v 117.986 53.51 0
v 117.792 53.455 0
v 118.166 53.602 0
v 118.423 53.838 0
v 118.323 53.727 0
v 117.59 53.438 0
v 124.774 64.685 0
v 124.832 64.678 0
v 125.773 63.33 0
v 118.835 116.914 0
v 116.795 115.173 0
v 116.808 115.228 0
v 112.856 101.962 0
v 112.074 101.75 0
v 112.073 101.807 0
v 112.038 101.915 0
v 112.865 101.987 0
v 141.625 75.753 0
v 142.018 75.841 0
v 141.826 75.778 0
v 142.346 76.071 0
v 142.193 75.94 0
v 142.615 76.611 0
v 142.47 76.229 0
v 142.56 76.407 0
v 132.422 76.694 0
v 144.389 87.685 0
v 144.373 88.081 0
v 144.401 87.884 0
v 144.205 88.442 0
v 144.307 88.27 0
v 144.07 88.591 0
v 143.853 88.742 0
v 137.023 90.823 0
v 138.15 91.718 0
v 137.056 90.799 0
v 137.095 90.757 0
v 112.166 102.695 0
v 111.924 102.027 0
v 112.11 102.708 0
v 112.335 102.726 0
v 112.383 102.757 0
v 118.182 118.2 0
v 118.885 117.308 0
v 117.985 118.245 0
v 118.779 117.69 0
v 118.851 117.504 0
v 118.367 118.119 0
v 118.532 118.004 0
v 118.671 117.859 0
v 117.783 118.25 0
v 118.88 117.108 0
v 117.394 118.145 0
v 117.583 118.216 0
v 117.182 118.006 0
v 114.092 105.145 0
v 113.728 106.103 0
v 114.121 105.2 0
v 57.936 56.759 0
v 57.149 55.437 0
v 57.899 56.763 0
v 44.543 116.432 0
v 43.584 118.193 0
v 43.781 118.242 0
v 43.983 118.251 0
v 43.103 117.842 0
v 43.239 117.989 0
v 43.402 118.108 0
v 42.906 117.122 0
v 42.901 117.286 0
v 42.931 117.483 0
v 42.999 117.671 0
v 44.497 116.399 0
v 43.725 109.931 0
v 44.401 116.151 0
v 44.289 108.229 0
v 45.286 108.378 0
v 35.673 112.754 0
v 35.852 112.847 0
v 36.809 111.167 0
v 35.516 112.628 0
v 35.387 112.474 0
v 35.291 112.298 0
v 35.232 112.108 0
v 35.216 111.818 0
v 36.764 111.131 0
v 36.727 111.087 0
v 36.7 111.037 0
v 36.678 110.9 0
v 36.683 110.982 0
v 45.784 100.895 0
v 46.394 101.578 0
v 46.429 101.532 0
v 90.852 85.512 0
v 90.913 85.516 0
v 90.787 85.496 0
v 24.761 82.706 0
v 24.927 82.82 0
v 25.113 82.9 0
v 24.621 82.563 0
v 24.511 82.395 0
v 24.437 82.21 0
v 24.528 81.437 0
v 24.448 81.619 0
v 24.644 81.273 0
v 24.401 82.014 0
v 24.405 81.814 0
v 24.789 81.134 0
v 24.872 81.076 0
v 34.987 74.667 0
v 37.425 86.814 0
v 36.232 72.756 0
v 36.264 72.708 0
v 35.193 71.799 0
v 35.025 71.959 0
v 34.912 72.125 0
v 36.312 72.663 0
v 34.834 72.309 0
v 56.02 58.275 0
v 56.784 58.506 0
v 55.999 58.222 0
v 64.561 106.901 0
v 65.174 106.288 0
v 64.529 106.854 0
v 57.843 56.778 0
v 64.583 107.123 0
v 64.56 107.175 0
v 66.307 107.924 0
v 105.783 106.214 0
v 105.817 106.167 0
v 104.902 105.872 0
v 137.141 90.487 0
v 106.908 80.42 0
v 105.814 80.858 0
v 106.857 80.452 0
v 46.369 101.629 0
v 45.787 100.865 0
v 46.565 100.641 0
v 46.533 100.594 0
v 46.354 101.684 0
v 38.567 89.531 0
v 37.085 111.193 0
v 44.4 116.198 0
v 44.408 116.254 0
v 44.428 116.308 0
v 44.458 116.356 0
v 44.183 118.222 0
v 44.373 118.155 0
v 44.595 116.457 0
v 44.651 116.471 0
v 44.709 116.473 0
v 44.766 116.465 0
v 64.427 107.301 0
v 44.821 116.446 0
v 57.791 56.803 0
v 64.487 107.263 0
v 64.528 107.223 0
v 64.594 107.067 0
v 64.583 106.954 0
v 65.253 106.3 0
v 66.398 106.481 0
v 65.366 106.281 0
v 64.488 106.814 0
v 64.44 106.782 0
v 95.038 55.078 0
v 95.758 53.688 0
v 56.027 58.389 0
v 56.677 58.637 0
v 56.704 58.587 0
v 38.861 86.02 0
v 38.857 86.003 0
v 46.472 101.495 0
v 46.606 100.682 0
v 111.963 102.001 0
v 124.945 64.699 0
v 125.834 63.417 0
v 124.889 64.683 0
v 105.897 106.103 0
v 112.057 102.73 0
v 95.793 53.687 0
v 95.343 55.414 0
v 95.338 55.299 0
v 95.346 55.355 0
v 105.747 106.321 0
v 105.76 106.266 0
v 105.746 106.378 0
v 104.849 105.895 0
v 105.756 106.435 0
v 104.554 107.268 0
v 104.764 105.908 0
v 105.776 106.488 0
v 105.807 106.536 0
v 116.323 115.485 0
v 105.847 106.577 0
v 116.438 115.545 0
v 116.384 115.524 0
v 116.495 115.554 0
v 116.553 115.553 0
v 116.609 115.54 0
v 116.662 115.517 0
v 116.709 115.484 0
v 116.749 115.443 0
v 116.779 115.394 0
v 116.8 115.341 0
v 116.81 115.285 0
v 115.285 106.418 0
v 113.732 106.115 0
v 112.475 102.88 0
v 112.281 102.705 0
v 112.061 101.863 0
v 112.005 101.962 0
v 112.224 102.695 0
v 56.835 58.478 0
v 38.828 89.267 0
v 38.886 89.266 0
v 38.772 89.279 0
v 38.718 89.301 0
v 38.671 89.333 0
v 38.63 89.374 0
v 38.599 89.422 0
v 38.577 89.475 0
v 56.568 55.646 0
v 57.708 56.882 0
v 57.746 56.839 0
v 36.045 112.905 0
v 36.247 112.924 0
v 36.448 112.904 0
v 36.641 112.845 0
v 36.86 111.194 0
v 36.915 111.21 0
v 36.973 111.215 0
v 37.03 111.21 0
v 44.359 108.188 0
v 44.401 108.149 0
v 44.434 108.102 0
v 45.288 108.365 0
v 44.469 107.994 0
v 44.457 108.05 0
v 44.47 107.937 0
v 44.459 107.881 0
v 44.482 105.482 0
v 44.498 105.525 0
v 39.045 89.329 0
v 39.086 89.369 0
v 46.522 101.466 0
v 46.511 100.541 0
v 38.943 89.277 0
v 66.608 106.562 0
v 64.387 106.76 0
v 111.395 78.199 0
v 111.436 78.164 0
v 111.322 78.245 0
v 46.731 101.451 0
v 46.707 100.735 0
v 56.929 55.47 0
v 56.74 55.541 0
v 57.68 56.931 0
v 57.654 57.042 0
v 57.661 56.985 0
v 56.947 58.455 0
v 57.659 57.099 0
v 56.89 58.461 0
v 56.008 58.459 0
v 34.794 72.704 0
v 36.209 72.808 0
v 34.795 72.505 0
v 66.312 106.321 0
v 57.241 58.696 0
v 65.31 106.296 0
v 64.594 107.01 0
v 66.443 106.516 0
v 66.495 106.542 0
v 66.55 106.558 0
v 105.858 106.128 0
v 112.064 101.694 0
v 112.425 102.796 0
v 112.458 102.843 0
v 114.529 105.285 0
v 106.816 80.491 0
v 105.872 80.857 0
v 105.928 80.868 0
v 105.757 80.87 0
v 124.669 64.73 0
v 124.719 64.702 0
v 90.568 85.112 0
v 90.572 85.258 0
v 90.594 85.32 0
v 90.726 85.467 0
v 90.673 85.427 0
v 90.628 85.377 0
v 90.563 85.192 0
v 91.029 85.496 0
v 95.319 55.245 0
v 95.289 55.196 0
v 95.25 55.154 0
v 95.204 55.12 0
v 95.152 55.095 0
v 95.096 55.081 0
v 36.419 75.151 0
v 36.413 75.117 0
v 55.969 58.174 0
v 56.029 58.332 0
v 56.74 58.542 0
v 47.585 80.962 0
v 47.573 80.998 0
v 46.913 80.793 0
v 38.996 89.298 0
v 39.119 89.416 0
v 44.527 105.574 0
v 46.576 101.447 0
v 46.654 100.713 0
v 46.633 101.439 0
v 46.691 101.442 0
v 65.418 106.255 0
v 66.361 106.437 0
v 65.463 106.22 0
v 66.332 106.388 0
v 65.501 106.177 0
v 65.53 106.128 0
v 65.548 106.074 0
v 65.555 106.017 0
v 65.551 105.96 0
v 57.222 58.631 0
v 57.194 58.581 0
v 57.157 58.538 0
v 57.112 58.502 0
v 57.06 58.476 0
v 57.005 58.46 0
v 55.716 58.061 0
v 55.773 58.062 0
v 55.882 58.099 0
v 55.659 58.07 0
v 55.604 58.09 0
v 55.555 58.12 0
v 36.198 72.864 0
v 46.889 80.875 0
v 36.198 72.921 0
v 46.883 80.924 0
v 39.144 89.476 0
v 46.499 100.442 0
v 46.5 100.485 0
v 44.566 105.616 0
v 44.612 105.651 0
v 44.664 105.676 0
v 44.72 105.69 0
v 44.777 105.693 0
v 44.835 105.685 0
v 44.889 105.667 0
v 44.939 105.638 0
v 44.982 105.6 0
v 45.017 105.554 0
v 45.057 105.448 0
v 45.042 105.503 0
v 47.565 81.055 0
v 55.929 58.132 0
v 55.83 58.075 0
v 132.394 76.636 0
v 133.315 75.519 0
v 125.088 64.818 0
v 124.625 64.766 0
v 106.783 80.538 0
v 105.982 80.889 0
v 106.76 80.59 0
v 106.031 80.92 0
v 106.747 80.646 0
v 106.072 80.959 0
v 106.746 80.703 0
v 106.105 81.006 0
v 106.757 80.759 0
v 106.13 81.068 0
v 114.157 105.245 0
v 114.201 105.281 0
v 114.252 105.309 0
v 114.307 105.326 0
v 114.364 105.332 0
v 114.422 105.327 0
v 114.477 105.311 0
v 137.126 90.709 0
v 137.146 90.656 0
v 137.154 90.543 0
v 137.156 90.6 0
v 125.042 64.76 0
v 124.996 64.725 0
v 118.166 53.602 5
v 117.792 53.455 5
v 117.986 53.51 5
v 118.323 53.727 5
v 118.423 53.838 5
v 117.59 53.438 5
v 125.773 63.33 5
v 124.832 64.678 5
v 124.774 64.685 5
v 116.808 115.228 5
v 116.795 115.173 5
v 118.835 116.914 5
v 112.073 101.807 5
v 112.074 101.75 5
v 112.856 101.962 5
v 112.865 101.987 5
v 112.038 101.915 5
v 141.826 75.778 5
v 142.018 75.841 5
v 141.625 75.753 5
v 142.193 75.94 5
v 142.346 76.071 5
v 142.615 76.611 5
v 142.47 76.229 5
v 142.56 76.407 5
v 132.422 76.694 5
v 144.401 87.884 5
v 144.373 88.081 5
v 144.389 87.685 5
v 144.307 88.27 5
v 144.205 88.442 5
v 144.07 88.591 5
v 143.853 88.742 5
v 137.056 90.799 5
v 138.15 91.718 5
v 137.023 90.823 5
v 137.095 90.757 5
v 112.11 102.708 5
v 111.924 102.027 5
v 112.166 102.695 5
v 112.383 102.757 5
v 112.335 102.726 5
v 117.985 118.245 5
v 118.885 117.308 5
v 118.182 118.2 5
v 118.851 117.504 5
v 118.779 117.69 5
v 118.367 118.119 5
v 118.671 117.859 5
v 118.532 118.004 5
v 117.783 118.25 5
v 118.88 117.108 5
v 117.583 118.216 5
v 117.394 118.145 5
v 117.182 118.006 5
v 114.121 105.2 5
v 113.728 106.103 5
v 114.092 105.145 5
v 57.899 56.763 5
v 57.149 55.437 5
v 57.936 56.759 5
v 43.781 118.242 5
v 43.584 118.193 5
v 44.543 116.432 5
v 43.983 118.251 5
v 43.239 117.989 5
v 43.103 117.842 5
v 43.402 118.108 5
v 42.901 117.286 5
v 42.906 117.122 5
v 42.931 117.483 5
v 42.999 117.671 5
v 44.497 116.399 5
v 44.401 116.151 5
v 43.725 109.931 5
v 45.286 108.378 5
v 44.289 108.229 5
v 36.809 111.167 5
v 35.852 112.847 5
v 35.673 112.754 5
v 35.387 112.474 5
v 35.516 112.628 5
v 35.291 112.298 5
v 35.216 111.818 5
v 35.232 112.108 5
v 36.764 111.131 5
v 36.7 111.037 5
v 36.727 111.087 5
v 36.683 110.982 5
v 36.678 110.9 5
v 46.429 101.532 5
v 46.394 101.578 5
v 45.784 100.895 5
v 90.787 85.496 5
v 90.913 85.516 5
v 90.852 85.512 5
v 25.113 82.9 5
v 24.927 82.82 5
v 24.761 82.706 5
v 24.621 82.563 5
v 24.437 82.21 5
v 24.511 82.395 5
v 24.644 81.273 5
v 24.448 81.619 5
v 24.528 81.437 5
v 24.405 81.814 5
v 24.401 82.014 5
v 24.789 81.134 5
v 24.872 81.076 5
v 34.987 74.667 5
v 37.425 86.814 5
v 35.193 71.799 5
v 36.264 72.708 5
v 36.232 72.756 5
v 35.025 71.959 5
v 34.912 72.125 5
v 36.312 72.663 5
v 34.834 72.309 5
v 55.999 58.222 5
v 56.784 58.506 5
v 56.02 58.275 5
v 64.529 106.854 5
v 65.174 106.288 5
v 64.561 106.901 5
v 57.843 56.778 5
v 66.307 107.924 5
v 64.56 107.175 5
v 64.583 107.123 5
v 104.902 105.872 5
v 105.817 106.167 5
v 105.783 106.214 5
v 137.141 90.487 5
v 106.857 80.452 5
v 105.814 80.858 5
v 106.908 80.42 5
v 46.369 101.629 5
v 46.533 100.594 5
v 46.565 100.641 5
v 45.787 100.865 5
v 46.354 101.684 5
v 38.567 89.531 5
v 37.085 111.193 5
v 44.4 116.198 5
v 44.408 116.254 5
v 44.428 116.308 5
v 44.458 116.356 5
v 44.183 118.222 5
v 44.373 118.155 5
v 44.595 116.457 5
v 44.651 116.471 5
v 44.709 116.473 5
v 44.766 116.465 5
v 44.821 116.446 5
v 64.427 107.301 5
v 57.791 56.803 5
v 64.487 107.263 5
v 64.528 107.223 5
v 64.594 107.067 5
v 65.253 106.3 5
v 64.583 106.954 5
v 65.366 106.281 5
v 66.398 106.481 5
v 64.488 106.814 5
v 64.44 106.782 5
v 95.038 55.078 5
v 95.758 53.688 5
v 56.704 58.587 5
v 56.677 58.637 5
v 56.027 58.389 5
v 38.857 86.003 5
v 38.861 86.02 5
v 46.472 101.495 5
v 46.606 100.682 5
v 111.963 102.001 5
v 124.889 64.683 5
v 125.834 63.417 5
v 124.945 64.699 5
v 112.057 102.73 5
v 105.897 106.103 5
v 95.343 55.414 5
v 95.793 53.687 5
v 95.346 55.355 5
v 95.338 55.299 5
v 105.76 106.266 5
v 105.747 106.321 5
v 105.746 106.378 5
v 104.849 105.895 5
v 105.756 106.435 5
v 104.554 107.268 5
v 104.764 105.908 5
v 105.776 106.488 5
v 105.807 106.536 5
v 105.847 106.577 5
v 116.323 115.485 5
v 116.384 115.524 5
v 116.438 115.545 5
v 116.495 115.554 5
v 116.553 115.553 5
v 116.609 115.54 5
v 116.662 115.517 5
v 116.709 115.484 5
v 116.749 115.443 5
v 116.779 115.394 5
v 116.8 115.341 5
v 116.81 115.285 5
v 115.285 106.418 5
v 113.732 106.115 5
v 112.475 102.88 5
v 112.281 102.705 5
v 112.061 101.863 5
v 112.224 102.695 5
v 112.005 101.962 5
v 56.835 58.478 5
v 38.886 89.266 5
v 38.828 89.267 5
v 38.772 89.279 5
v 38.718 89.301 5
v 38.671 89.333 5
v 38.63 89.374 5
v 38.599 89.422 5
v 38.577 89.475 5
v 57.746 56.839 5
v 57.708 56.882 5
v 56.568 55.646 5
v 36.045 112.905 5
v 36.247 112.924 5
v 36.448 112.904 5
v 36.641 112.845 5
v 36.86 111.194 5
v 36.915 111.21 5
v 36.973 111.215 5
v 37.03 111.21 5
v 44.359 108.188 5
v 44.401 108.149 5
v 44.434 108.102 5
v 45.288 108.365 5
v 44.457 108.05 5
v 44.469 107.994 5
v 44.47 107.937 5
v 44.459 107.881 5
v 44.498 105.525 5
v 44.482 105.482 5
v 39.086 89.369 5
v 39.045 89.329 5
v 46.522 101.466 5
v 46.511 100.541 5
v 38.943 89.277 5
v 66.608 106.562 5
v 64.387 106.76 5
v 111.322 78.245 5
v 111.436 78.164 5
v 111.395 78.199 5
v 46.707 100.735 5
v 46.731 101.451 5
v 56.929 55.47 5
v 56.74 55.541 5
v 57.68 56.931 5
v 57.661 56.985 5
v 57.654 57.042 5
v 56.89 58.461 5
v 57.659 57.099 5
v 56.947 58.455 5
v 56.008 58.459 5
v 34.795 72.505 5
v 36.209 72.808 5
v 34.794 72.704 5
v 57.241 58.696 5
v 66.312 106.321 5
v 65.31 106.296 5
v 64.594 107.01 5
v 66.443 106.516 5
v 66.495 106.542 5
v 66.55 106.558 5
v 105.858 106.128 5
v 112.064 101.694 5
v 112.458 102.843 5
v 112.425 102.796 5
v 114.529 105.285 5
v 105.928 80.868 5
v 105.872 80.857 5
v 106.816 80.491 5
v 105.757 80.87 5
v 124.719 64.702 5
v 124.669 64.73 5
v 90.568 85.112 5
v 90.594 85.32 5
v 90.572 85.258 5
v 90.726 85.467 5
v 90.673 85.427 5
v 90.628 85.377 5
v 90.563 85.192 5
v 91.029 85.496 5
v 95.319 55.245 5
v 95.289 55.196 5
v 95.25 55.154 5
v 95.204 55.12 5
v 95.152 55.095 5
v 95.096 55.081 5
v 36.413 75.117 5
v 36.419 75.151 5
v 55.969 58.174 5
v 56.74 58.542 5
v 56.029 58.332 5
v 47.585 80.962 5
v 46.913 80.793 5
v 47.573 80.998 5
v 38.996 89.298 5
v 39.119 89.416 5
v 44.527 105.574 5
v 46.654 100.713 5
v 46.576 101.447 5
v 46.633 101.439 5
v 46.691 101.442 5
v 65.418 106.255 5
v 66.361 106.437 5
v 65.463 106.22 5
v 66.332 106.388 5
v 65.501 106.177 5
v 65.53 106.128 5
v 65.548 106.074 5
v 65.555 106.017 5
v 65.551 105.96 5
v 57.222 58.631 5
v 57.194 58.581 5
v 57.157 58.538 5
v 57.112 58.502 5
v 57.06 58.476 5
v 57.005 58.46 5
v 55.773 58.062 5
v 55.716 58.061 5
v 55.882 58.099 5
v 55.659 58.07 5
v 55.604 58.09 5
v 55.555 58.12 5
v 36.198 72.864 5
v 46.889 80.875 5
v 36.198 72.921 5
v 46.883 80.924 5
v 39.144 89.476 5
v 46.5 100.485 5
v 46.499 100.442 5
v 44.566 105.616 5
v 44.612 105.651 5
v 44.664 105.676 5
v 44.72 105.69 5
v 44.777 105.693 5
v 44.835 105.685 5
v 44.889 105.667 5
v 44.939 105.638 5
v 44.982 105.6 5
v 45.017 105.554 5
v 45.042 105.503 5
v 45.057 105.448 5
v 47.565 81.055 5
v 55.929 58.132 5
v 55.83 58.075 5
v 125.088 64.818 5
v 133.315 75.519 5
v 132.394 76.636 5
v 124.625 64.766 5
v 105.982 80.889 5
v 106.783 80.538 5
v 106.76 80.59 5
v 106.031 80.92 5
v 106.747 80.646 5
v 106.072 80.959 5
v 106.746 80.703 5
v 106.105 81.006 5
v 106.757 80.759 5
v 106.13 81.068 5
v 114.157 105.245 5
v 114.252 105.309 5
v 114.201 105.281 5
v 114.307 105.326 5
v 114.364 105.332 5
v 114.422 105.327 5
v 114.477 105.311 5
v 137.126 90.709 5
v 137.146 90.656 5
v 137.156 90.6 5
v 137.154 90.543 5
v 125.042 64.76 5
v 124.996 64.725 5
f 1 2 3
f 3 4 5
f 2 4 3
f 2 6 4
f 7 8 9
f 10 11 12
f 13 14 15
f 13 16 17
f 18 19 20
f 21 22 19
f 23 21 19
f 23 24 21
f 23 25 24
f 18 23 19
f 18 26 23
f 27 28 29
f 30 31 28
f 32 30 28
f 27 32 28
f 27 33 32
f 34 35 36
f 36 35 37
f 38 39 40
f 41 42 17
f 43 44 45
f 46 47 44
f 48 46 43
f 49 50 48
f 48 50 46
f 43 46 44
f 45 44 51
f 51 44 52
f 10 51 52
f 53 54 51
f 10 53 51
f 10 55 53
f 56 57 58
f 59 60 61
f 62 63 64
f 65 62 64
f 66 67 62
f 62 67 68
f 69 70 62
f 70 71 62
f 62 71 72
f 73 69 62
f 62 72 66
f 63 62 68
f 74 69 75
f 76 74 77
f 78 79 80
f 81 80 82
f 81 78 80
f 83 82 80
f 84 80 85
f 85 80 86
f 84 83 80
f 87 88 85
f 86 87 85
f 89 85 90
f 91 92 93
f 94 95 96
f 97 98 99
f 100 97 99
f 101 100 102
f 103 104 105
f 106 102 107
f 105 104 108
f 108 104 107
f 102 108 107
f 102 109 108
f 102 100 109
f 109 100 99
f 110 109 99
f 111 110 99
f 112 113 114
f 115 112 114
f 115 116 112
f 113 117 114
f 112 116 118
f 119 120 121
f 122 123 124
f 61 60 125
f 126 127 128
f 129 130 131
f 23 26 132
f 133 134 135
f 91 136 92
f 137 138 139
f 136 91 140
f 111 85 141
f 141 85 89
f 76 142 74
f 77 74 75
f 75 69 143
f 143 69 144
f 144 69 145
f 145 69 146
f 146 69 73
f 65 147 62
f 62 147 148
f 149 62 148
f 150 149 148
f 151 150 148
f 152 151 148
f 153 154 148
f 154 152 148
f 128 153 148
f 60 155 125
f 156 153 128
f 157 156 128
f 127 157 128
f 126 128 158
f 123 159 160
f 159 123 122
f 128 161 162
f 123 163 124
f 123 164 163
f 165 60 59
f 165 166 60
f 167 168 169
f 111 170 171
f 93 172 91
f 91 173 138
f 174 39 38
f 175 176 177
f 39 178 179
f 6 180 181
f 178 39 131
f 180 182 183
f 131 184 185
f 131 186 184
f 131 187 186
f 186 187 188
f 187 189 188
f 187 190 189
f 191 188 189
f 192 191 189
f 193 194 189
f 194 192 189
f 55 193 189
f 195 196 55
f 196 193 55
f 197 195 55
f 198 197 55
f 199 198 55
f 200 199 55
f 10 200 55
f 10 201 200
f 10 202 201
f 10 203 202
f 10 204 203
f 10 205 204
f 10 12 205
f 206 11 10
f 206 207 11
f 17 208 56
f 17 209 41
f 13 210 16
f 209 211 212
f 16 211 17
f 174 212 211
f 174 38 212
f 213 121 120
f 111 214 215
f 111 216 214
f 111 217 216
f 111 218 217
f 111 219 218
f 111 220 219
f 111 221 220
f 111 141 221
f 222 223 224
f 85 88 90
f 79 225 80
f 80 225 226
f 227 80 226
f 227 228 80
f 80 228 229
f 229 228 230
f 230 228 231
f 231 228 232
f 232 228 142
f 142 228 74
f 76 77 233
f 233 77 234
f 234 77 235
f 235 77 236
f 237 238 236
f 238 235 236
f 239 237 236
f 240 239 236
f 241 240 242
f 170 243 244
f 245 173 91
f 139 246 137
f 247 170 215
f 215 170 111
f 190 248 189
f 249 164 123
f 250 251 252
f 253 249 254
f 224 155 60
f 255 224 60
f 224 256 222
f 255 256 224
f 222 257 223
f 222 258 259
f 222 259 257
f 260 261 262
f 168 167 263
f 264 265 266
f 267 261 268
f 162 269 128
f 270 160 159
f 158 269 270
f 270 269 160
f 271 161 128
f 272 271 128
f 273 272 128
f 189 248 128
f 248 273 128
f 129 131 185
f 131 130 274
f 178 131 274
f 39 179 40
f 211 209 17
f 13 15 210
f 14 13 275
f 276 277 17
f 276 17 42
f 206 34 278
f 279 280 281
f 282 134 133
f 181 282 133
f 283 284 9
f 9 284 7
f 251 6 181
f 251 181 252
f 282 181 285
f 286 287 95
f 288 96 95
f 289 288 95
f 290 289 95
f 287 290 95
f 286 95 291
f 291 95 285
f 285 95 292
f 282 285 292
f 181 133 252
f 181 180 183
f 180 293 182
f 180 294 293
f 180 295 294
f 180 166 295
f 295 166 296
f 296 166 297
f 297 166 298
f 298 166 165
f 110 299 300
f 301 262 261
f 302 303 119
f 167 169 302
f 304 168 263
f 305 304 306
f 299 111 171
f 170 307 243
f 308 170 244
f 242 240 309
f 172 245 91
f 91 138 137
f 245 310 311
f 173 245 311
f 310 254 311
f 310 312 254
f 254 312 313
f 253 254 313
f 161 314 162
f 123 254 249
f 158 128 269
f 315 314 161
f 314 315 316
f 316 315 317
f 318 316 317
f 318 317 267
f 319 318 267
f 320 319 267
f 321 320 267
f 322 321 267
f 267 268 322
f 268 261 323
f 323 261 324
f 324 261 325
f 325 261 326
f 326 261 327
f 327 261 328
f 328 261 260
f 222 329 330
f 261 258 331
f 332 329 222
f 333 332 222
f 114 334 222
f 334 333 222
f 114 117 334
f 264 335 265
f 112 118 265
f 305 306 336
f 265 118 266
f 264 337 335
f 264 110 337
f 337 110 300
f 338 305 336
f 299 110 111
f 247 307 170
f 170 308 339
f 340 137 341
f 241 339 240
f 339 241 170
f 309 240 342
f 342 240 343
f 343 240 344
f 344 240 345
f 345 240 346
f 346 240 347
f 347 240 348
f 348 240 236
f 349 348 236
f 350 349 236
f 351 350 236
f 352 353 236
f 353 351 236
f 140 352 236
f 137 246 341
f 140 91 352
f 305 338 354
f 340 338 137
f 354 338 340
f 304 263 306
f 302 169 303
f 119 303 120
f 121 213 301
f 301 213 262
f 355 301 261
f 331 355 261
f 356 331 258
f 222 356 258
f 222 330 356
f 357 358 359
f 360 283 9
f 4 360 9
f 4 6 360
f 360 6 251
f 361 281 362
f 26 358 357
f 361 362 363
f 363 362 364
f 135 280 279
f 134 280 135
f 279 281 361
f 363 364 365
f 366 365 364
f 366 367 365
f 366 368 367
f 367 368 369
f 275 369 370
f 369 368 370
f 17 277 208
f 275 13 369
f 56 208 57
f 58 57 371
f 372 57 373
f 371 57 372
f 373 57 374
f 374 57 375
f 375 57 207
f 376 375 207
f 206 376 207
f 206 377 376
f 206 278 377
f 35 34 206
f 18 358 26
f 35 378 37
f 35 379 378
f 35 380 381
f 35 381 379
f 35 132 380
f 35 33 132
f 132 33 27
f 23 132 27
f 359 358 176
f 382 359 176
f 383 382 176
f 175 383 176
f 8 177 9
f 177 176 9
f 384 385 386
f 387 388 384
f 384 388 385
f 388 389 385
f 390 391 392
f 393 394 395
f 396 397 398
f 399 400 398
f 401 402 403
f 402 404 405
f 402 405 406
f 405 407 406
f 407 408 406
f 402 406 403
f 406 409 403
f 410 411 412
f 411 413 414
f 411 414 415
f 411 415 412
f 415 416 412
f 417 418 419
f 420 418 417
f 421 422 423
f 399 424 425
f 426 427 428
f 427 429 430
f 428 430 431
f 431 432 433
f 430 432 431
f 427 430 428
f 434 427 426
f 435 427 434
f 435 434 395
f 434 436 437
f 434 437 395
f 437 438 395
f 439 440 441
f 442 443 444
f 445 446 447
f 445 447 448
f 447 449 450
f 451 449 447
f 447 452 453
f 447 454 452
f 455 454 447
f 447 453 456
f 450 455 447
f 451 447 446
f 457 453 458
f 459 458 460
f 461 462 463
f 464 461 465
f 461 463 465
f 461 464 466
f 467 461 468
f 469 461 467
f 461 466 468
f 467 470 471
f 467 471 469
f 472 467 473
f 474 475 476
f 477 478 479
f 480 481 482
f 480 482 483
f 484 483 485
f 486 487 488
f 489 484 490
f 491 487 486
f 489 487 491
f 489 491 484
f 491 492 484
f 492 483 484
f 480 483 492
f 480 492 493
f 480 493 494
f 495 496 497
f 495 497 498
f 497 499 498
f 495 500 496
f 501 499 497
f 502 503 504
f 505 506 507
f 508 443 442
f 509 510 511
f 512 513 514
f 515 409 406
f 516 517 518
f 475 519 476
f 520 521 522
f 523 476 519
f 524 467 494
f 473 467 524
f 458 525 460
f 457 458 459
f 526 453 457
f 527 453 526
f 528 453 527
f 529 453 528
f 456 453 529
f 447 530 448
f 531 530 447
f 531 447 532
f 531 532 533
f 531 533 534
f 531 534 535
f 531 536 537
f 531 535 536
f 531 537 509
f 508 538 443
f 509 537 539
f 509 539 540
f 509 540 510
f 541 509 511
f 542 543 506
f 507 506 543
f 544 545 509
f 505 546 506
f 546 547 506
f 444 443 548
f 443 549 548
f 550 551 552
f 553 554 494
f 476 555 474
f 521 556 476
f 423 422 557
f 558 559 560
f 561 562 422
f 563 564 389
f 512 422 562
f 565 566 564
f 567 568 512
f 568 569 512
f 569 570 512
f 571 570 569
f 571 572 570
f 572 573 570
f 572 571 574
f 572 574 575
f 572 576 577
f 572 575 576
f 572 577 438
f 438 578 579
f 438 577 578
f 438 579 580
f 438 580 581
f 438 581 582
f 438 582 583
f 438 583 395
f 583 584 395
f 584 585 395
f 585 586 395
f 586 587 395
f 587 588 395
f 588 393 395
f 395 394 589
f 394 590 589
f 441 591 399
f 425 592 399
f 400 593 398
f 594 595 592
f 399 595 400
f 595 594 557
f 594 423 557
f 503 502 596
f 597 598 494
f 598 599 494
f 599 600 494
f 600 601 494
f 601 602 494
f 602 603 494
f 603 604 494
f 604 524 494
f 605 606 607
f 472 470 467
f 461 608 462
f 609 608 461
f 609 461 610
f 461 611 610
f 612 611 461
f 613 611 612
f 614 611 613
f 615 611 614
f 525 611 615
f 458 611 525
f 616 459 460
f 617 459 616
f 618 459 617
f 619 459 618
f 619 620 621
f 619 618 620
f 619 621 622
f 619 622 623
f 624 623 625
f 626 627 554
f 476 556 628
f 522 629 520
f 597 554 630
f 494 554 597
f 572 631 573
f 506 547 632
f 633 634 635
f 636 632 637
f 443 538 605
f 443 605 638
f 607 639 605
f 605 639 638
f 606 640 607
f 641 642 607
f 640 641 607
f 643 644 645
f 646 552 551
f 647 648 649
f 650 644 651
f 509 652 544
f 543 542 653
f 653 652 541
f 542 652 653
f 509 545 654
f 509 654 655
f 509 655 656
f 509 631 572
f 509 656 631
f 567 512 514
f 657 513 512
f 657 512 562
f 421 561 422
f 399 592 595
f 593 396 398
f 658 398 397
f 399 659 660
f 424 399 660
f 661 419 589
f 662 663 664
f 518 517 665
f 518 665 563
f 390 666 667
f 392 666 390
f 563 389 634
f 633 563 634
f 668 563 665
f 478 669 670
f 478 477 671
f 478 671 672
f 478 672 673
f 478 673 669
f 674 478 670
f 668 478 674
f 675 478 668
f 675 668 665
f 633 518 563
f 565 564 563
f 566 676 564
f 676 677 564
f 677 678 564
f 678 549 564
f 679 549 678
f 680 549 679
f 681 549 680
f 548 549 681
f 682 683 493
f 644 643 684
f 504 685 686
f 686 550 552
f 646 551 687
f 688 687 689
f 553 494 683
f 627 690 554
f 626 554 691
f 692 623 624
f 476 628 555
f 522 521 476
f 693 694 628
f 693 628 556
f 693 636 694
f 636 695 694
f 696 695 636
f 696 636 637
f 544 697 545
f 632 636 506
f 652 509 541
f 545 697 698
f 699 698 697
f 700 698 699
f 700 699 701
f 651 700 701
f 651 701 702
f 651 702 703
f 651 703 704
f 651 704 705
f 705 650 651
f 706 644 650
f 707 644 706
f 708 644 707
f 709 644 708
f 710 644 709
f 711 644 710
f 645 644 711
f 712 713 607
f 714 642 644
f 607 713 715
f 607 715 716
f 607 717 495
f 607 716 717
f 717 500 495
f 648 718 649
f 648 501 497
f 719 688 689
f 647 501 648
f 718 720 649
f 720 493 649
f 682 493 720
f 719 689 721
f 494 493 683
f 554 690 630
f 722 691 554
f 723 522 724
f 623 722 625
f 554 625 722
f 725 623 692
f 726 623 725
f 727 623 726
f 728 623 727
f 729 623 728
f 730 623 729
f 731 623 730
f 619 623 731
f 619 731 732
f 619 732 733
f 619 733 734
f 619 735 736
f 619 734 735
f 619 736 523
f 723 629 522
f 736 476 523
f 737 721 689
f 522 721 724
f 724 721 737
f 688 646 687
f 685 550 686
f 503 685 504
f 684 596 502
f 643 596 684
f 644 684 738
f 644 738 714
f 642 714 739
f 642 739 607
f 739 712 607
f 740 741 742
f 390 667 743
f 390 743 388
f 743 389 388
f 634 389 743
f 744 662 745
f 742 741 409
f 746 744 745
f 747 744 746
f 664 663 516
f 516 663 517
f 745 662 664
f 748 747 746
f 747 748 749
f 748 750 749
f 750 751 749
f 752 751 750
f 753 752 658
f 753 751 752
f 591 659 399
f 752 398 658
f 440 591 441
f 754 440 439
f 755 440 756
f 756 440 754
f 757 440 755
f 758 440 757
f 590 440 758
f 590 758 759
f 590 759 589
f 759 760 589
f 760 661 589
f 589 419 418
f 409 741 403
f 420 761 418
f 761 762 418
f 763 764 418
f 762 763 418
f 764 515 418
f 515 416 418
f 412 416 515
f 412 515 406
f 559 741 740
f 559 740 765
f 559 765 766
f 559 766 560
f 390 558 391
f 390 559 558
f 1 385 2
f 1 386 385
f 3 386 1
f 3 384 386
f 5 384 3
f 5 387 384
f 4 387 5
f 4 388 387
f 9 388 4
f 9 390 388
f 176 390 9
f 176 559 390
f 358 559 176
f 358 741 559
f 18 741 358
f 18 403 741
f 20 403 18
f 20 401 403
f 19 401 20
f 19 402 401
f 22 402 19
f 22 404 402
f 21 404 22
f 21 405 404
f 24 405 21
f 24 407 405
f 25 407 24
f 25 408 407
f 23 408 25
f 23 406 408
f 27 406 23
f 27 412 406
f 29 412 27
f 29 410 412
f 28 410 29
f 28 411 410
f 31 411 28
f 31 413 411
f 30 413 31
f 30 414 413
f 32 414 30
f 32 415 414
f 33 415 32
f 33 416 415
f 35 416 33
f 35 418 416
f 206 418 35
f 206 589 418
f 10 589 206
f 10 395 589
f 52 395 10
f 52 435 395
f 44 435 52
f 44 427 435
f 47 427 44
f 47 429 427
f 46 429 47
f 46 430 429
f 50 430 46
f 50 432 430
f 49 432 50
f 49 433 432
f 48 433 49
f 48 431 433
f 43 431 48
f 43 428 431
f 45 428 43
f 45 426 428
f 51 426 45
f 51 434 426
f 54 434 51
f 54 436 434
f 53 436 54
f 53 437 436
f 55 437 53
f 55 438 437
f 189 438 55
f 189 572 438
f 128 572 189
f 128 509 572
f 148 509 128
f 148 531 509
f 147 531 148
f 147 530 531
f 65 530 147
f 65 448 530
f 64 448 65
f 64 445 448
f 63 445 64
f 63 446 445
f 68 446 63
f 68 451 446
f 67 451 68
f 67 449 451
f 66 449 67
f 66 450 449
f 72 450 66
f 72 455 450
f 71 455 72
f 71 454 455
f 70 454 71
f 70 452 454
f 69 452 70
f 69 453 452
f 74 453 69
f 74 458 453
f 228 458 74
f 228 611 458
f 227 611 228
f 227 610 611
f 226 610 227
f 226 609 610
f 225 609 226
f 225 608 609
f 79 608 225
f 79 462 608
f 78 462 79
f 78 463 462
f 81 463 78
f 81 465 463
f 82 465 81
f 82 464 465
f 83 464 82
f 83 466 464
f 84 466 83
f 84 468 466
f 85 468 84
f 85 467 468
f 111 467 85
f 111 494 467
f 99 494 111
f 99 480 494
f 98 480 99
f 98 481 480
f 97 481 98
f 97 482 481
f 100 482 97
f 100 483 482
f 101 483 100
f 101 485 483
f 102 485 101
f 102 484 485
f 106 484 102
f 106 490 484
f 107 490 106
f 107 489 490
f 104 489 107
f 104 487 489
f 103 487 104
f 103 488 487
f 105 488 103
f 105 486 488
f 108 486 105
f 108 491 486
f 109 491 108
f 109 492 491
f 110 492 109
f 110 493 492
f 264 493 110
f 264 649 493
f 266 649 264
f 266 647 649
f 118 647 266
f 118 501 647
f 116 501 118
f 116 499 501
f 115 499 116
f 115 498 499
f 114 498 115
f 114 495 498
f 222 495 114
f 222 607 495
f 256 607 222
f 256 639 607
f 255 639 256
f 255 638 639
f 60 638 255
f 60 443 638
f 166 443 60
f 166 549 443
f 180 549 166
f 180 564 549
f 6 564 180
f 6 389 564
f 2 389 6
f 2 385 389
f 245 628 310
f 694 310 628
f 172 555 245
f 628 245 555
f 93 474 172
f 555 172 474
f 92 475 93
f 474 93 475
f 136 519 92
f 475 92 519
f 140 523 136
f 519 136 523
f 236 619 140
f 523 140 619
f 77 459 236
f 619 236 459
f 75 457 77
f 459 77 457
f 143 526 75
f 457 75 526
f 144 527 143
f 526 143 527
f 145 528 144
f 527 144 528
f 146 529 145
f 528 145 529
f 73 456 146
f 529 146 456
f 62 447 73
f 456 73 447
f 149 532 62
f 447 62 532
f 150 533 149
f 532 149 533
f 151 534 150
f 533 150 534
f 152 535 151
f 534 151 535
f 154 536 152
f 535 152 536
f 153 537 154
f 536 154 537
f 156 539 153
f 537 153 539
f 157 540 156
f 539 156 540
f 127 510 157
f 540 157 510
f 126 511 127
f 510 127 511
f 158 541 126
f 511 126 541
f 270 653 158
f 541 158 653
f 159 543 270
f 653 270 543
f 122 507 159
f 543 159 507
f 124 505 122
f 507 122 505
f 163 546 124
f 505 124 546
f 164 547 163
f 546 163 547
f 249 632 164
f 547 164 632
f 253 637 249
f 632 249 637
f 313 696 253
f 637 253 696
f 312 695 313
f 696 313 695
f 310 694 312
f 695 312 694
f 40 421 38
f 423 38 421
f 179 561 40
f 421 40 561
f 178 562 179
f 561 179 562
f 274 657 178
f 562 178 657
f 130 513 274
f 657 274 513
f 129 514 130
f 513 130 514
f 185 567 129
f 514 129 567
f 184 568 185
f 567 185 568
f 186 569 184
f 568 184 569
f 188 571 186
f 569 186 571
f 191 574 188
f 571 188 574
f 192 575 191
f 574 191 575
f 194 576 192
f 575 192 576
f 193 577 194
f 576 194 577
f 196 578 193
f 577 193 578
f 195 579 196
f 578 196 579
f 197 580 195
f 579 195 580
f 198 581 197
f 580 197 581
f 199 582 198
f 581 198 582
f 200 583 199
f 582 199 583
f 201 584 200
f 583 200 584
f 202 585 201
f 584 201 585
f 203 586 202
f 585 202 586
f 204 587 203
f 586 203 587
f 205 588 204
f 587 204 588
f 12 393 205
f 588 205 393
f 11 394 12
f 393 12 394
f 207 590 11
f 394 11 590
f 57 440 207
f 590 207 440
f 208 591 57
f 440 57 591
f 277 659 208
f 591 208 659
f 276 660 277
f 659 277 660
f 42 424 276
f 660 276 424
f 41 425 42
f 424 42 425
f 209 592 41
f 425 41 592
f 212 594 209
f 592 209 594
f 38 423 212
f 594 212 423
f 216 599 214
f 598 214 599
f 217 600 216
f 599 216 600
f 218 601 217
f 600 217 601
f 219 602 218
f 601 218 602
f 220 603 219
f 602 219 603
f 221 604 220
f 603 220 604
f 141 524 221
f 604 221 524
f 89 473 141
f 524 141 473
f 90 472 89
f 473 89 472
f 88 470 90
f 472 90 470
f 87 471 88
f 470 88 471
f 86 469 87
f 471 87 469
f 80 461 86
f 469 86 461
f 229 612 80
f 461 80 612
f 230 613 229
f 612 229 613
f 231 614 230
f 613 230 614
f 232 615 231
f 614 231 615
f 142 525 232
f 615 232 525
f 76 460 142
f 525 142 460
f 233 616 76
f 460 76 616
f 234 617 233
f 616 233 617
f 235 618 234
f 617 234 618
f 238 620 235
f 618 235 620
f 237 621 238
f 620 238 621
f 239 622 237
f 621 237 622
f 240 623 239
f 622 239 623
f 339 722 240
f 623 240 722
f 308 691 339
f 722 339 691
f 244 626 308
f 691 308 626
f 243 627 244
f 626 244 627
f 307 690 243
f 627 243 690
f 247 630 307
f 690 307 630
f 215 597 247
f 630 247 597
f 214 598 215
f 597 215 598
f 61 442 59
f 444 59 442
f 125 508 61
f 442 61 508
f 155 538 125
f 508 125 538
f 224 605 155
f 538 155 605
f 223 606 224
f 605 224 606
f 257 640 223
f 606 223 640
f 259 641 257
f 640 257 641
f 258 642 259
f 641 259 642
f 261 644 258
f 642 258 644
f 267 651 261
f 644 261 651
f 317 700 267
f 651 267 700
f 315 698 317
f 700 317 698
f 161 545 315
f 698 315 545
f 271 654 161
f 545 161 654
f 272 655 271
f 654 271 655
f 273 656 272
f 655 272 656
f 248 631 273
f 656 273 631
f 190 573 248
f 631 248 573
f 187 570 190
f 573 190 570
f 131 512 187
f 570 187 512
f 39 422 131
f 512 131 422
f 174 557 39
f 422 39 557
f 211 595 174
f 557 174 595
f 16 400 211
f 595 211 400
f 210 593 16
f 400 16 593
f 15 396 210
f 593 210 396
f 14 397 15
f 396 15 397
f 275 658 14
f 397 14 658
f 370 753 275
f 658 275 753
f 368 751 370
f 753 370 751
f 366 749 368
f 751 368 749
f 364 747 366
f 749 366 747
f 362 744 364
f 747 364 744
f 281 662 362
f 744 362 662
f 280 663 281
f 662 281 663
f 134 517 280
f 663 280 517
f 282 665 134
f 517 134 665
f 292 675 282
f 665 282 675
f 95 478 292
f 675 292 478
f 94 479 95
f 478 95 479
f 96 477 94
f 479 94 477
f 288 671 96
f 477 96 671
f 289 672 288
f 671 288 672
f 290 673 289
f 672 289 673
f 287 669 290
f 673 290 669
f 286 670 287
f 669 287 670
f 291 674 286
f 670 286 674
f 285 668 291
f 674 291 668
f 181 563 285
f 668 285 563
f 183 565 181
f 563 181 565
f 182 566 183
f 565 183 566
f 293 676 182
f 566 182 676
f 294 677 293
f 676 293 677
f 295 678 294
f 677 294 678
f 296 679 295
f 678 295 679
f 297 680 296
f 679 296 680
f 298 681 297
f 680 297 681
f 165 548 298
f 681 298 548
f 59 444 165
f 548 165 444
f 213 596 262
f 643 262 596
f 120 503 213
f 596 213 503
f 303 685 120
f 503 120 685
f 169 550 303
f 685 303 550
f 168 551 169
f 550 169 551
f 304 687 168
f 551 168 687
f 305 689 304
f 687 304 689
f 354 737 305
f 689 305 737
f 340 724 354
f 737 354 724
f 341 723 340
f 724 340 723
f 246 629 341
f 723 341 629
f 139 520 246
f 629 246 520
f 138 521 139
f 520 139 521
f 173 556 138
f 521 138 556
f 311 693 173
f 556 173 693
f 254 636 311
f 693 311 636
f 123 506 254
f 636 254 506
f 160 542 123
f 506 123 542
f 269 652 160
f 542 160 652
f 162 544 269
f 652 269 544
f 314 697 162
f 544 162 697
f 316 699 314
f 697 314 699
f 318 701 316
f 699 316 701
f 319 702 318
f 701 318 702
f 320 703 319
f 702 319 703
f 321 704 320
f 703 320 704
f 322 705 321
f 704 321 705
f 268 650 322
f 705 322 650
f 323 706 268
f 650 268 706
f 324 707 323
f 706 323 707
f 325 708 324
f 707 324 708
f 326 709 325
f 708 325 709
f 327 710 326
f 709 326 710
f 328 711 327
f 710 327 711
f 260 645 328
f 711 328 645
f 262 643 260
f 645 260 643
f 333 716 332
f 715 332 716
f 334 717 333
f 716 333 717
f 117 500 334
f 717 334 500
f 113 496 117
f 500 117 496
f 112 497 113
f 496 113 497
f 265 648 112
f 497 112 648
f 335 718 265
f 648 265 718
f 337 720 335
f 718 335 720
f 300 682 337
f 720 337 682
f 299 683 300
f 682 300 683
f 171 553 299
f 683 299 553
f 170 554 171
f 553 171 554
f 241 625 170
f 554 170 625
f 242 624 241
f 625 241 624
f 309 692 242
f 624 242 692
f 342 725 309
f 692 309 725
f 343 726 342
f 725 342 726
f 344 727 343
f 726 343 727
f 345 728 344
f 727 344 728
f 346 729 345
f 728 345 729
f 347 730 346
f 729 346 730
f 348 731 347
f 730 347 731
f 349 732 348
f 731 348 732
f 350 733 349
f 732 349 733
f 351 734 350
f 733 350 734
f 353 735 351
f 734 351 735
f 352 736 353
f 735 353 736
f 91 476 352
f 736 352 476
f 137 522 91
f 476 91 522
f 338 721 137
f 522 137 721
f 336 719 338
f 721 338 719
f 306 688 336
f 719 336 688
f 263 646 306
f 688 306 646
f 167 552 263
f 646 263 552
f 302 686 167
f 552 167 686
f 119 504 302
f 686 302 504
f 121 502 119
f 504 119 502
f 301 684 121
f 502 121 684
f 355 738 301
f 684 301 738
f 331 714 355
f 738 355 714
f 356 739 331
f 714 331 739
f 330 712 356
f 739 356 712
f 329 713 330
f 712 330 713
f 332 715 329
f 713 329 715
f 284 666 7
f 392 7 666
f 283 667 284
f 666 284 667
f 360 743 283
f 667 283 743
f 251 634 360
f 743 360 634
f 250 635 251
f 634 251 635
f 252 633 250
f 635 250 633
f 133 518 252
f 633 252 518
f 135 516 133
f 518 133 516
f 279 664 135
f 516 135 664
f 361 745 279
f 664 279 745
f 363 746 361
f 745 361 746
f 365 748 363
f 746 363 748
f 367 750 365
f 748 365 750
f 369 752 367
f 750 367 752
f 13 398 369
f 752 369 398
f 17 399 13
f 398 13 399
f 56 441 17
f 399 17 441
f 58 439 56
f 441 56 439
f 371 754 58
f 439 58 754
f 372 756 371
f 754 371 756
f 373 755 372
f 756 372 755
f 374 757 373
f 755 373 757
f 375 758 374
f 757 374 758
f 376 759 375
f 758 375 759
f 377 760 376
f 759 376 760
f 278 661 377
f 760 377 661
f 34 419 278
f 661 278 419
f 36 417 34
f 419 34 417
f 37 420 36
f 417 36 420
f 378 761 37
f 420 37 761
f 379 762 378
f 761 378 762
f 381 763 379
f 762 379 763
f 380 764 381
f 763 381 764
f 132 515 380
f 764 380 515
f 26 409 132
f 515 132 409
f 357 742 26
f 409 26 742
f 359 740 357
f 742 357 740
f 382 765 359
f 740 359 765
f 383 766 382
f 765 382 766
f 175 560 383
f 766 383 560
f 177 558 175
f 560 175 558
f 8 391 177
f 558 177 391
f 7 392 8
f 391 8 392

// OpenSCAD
/*
 * Customizable Origami - Pig - https://www.thingiverse.com/thing:2669227
 * by Dennis Hofmann - https://www.thingiverse.com/mightynozzle/about
 * created 2017-11-26
 * version v1.0
 *
 * Changelog
 * --------------
 * v1.0:
 *      - final design
 * --------------
 * 
 * This work is licensed under the Creative Commons - Attribution - NonCommercial - ShareAlike license.
 * https://creativecommons.org/licenses/by-nc-sa/3.0/
 */


 // Parameter Section //
//-------------------//

// preview[view:north, tilt:top]

// The maximum size of the longest side. The shorter side will be automatically resized in same ratio.
max_size_in_millimeter = 120; //[20:300]

// The height of the model.
model_height_in_millimeter = 5; //[0.2:0.2:100]

// Thickness of the outer outline.
outline_size_in_millimeter = 1.4; //[0.5:0.1:20]

// Thickness of the inner outline.
inline_size_in_millimeter = 0.7; //[0.5:0.1:20]

// Roundiness of the ends of the inner outlines.
inline_edge_radius_in_millimeter = 0.3; //[0.0:0.1:5]

// Flip model
flip_model = "no"; //[yes,no]

/*[hidden]*/
max_size = max_size_in_millimeter;
model_height = model_height_in_millimeter;
$fn=32;

// Outer Points
A1 = [301, 984];
A2 = [427, 903];
A3 = [424, 872];
A4 = [677, 678];
A5 = [1134, 657];
A6 = [1392, 654];
A7 = [1479, 768];
A8 = [1571, 919];
A9 = [1676, 922];
A10 = [1697, 1055];
A11 = [1629, 1091];
A12 = [1350, 1273];
A13 = [1395, 1408];
A14 = [1242, 1276];
A15 = [782, 1284];
A16 = [520, 1408];
A17 = [532, 1301];
A18 = [429, 1344];
A19 = [456, 1034];

outline = [A1, A2, A3, A4, A5, A6, A7, A8, A9, A10, A11, A12, A13, A14, A15, A16, A17, A18, A19];

// Inner Points
B1 = [559, 972];
B2 = [546, 1212];
B3 = [1076, 1023];
B4 = [1316, 936];
B5 = [1258, 965];
B6 = [1332, 1226];

// Polygons
C1 = [A1, A2, A19];
C2 = [A3, A4, B1, B2, A17, A19, A2];
C3 = [A19, A17, A18];
C4 = [A17, B2, A15, A16];
C5 = [A4, A15, B2, B1];
C6 = [A4, A5, B3, B5, B6, A14, A15];
C7 = [B3, B5, B4, A7, A6, A5];
C8 = [A7, A8, A11, A12, B6, B5, B4];
C9 = [A14, B6, A12, A13];
C10 = [A8, A11, A10, A9];

cut_polygons = [/*C1,*/ C2, C3, C4, C5, C6, /*C7,*/ C8, C9, /*C10*/];

min_x = A1[0];
min_y = A6[1];
max_x = A10[0];
max_y = A13[1];

x_size = max_x - min_x;
y_size = max_y - min_y;

x_factor = max_size / x_size;
y_factor = max_size / y_size;

inline_size = x_size > y_size ? inline_size_in_millimeter / x_factor / 2: inline_size_in_millimeter / y_factor / 2;
inline_edge_radius = x_size > y_size ? inline_edge_radius_in_millimeter / x_factor: inline_edge_radius_in_millimeter / y_factor;
outline_size = x_size > y_size ? outline_size_in_millimeter / x_factor - inline_size: outline_size_in_millimeter / y_factor - inline_size;


 // Program Section //
//-----------------//

if(x_size > y_size) {
    resize(newsize=[max_size, x_factor * y_size, model_height]){
        if(flip_model == "yes") {
            mirror([0,1,0]) {
                rotate([180,180,0]) {    
                    create(outline, cut_polygons);
                }
            }
        } else {
            create(outline, cut_polygons);
        }
    }
} else {
    resize(newsize=[y_factor * x_size, max_size, model_height]){
        if(flip_model == "yes") {
            mirror([0,1,0]) {
                rotate([180,180,0]) {    
                    create(outline, cut_polygons);
                }
            }
        } else {
            create(outline, cut_polygons);
        }
    }
}


 // Module Section //
//----------------//

module create() {
    linear_extrude(height=1) {
        difference() {
            offset(r = -0) {
                offset(r = +outline_size) {
                    polygon(points = outline, convexity = 10);
                }
            }
            
            for(cut_polygon = [0:len(cut_polygons)]) {
                offset(r = +inline_edge_radius) {
                    offset(r = -inline_size - inline_edge_radius) {
                        polygon(points = cut_polygons[cut_polygon], convexity = 10);
                    }
                }
            }
        }
    }
}
